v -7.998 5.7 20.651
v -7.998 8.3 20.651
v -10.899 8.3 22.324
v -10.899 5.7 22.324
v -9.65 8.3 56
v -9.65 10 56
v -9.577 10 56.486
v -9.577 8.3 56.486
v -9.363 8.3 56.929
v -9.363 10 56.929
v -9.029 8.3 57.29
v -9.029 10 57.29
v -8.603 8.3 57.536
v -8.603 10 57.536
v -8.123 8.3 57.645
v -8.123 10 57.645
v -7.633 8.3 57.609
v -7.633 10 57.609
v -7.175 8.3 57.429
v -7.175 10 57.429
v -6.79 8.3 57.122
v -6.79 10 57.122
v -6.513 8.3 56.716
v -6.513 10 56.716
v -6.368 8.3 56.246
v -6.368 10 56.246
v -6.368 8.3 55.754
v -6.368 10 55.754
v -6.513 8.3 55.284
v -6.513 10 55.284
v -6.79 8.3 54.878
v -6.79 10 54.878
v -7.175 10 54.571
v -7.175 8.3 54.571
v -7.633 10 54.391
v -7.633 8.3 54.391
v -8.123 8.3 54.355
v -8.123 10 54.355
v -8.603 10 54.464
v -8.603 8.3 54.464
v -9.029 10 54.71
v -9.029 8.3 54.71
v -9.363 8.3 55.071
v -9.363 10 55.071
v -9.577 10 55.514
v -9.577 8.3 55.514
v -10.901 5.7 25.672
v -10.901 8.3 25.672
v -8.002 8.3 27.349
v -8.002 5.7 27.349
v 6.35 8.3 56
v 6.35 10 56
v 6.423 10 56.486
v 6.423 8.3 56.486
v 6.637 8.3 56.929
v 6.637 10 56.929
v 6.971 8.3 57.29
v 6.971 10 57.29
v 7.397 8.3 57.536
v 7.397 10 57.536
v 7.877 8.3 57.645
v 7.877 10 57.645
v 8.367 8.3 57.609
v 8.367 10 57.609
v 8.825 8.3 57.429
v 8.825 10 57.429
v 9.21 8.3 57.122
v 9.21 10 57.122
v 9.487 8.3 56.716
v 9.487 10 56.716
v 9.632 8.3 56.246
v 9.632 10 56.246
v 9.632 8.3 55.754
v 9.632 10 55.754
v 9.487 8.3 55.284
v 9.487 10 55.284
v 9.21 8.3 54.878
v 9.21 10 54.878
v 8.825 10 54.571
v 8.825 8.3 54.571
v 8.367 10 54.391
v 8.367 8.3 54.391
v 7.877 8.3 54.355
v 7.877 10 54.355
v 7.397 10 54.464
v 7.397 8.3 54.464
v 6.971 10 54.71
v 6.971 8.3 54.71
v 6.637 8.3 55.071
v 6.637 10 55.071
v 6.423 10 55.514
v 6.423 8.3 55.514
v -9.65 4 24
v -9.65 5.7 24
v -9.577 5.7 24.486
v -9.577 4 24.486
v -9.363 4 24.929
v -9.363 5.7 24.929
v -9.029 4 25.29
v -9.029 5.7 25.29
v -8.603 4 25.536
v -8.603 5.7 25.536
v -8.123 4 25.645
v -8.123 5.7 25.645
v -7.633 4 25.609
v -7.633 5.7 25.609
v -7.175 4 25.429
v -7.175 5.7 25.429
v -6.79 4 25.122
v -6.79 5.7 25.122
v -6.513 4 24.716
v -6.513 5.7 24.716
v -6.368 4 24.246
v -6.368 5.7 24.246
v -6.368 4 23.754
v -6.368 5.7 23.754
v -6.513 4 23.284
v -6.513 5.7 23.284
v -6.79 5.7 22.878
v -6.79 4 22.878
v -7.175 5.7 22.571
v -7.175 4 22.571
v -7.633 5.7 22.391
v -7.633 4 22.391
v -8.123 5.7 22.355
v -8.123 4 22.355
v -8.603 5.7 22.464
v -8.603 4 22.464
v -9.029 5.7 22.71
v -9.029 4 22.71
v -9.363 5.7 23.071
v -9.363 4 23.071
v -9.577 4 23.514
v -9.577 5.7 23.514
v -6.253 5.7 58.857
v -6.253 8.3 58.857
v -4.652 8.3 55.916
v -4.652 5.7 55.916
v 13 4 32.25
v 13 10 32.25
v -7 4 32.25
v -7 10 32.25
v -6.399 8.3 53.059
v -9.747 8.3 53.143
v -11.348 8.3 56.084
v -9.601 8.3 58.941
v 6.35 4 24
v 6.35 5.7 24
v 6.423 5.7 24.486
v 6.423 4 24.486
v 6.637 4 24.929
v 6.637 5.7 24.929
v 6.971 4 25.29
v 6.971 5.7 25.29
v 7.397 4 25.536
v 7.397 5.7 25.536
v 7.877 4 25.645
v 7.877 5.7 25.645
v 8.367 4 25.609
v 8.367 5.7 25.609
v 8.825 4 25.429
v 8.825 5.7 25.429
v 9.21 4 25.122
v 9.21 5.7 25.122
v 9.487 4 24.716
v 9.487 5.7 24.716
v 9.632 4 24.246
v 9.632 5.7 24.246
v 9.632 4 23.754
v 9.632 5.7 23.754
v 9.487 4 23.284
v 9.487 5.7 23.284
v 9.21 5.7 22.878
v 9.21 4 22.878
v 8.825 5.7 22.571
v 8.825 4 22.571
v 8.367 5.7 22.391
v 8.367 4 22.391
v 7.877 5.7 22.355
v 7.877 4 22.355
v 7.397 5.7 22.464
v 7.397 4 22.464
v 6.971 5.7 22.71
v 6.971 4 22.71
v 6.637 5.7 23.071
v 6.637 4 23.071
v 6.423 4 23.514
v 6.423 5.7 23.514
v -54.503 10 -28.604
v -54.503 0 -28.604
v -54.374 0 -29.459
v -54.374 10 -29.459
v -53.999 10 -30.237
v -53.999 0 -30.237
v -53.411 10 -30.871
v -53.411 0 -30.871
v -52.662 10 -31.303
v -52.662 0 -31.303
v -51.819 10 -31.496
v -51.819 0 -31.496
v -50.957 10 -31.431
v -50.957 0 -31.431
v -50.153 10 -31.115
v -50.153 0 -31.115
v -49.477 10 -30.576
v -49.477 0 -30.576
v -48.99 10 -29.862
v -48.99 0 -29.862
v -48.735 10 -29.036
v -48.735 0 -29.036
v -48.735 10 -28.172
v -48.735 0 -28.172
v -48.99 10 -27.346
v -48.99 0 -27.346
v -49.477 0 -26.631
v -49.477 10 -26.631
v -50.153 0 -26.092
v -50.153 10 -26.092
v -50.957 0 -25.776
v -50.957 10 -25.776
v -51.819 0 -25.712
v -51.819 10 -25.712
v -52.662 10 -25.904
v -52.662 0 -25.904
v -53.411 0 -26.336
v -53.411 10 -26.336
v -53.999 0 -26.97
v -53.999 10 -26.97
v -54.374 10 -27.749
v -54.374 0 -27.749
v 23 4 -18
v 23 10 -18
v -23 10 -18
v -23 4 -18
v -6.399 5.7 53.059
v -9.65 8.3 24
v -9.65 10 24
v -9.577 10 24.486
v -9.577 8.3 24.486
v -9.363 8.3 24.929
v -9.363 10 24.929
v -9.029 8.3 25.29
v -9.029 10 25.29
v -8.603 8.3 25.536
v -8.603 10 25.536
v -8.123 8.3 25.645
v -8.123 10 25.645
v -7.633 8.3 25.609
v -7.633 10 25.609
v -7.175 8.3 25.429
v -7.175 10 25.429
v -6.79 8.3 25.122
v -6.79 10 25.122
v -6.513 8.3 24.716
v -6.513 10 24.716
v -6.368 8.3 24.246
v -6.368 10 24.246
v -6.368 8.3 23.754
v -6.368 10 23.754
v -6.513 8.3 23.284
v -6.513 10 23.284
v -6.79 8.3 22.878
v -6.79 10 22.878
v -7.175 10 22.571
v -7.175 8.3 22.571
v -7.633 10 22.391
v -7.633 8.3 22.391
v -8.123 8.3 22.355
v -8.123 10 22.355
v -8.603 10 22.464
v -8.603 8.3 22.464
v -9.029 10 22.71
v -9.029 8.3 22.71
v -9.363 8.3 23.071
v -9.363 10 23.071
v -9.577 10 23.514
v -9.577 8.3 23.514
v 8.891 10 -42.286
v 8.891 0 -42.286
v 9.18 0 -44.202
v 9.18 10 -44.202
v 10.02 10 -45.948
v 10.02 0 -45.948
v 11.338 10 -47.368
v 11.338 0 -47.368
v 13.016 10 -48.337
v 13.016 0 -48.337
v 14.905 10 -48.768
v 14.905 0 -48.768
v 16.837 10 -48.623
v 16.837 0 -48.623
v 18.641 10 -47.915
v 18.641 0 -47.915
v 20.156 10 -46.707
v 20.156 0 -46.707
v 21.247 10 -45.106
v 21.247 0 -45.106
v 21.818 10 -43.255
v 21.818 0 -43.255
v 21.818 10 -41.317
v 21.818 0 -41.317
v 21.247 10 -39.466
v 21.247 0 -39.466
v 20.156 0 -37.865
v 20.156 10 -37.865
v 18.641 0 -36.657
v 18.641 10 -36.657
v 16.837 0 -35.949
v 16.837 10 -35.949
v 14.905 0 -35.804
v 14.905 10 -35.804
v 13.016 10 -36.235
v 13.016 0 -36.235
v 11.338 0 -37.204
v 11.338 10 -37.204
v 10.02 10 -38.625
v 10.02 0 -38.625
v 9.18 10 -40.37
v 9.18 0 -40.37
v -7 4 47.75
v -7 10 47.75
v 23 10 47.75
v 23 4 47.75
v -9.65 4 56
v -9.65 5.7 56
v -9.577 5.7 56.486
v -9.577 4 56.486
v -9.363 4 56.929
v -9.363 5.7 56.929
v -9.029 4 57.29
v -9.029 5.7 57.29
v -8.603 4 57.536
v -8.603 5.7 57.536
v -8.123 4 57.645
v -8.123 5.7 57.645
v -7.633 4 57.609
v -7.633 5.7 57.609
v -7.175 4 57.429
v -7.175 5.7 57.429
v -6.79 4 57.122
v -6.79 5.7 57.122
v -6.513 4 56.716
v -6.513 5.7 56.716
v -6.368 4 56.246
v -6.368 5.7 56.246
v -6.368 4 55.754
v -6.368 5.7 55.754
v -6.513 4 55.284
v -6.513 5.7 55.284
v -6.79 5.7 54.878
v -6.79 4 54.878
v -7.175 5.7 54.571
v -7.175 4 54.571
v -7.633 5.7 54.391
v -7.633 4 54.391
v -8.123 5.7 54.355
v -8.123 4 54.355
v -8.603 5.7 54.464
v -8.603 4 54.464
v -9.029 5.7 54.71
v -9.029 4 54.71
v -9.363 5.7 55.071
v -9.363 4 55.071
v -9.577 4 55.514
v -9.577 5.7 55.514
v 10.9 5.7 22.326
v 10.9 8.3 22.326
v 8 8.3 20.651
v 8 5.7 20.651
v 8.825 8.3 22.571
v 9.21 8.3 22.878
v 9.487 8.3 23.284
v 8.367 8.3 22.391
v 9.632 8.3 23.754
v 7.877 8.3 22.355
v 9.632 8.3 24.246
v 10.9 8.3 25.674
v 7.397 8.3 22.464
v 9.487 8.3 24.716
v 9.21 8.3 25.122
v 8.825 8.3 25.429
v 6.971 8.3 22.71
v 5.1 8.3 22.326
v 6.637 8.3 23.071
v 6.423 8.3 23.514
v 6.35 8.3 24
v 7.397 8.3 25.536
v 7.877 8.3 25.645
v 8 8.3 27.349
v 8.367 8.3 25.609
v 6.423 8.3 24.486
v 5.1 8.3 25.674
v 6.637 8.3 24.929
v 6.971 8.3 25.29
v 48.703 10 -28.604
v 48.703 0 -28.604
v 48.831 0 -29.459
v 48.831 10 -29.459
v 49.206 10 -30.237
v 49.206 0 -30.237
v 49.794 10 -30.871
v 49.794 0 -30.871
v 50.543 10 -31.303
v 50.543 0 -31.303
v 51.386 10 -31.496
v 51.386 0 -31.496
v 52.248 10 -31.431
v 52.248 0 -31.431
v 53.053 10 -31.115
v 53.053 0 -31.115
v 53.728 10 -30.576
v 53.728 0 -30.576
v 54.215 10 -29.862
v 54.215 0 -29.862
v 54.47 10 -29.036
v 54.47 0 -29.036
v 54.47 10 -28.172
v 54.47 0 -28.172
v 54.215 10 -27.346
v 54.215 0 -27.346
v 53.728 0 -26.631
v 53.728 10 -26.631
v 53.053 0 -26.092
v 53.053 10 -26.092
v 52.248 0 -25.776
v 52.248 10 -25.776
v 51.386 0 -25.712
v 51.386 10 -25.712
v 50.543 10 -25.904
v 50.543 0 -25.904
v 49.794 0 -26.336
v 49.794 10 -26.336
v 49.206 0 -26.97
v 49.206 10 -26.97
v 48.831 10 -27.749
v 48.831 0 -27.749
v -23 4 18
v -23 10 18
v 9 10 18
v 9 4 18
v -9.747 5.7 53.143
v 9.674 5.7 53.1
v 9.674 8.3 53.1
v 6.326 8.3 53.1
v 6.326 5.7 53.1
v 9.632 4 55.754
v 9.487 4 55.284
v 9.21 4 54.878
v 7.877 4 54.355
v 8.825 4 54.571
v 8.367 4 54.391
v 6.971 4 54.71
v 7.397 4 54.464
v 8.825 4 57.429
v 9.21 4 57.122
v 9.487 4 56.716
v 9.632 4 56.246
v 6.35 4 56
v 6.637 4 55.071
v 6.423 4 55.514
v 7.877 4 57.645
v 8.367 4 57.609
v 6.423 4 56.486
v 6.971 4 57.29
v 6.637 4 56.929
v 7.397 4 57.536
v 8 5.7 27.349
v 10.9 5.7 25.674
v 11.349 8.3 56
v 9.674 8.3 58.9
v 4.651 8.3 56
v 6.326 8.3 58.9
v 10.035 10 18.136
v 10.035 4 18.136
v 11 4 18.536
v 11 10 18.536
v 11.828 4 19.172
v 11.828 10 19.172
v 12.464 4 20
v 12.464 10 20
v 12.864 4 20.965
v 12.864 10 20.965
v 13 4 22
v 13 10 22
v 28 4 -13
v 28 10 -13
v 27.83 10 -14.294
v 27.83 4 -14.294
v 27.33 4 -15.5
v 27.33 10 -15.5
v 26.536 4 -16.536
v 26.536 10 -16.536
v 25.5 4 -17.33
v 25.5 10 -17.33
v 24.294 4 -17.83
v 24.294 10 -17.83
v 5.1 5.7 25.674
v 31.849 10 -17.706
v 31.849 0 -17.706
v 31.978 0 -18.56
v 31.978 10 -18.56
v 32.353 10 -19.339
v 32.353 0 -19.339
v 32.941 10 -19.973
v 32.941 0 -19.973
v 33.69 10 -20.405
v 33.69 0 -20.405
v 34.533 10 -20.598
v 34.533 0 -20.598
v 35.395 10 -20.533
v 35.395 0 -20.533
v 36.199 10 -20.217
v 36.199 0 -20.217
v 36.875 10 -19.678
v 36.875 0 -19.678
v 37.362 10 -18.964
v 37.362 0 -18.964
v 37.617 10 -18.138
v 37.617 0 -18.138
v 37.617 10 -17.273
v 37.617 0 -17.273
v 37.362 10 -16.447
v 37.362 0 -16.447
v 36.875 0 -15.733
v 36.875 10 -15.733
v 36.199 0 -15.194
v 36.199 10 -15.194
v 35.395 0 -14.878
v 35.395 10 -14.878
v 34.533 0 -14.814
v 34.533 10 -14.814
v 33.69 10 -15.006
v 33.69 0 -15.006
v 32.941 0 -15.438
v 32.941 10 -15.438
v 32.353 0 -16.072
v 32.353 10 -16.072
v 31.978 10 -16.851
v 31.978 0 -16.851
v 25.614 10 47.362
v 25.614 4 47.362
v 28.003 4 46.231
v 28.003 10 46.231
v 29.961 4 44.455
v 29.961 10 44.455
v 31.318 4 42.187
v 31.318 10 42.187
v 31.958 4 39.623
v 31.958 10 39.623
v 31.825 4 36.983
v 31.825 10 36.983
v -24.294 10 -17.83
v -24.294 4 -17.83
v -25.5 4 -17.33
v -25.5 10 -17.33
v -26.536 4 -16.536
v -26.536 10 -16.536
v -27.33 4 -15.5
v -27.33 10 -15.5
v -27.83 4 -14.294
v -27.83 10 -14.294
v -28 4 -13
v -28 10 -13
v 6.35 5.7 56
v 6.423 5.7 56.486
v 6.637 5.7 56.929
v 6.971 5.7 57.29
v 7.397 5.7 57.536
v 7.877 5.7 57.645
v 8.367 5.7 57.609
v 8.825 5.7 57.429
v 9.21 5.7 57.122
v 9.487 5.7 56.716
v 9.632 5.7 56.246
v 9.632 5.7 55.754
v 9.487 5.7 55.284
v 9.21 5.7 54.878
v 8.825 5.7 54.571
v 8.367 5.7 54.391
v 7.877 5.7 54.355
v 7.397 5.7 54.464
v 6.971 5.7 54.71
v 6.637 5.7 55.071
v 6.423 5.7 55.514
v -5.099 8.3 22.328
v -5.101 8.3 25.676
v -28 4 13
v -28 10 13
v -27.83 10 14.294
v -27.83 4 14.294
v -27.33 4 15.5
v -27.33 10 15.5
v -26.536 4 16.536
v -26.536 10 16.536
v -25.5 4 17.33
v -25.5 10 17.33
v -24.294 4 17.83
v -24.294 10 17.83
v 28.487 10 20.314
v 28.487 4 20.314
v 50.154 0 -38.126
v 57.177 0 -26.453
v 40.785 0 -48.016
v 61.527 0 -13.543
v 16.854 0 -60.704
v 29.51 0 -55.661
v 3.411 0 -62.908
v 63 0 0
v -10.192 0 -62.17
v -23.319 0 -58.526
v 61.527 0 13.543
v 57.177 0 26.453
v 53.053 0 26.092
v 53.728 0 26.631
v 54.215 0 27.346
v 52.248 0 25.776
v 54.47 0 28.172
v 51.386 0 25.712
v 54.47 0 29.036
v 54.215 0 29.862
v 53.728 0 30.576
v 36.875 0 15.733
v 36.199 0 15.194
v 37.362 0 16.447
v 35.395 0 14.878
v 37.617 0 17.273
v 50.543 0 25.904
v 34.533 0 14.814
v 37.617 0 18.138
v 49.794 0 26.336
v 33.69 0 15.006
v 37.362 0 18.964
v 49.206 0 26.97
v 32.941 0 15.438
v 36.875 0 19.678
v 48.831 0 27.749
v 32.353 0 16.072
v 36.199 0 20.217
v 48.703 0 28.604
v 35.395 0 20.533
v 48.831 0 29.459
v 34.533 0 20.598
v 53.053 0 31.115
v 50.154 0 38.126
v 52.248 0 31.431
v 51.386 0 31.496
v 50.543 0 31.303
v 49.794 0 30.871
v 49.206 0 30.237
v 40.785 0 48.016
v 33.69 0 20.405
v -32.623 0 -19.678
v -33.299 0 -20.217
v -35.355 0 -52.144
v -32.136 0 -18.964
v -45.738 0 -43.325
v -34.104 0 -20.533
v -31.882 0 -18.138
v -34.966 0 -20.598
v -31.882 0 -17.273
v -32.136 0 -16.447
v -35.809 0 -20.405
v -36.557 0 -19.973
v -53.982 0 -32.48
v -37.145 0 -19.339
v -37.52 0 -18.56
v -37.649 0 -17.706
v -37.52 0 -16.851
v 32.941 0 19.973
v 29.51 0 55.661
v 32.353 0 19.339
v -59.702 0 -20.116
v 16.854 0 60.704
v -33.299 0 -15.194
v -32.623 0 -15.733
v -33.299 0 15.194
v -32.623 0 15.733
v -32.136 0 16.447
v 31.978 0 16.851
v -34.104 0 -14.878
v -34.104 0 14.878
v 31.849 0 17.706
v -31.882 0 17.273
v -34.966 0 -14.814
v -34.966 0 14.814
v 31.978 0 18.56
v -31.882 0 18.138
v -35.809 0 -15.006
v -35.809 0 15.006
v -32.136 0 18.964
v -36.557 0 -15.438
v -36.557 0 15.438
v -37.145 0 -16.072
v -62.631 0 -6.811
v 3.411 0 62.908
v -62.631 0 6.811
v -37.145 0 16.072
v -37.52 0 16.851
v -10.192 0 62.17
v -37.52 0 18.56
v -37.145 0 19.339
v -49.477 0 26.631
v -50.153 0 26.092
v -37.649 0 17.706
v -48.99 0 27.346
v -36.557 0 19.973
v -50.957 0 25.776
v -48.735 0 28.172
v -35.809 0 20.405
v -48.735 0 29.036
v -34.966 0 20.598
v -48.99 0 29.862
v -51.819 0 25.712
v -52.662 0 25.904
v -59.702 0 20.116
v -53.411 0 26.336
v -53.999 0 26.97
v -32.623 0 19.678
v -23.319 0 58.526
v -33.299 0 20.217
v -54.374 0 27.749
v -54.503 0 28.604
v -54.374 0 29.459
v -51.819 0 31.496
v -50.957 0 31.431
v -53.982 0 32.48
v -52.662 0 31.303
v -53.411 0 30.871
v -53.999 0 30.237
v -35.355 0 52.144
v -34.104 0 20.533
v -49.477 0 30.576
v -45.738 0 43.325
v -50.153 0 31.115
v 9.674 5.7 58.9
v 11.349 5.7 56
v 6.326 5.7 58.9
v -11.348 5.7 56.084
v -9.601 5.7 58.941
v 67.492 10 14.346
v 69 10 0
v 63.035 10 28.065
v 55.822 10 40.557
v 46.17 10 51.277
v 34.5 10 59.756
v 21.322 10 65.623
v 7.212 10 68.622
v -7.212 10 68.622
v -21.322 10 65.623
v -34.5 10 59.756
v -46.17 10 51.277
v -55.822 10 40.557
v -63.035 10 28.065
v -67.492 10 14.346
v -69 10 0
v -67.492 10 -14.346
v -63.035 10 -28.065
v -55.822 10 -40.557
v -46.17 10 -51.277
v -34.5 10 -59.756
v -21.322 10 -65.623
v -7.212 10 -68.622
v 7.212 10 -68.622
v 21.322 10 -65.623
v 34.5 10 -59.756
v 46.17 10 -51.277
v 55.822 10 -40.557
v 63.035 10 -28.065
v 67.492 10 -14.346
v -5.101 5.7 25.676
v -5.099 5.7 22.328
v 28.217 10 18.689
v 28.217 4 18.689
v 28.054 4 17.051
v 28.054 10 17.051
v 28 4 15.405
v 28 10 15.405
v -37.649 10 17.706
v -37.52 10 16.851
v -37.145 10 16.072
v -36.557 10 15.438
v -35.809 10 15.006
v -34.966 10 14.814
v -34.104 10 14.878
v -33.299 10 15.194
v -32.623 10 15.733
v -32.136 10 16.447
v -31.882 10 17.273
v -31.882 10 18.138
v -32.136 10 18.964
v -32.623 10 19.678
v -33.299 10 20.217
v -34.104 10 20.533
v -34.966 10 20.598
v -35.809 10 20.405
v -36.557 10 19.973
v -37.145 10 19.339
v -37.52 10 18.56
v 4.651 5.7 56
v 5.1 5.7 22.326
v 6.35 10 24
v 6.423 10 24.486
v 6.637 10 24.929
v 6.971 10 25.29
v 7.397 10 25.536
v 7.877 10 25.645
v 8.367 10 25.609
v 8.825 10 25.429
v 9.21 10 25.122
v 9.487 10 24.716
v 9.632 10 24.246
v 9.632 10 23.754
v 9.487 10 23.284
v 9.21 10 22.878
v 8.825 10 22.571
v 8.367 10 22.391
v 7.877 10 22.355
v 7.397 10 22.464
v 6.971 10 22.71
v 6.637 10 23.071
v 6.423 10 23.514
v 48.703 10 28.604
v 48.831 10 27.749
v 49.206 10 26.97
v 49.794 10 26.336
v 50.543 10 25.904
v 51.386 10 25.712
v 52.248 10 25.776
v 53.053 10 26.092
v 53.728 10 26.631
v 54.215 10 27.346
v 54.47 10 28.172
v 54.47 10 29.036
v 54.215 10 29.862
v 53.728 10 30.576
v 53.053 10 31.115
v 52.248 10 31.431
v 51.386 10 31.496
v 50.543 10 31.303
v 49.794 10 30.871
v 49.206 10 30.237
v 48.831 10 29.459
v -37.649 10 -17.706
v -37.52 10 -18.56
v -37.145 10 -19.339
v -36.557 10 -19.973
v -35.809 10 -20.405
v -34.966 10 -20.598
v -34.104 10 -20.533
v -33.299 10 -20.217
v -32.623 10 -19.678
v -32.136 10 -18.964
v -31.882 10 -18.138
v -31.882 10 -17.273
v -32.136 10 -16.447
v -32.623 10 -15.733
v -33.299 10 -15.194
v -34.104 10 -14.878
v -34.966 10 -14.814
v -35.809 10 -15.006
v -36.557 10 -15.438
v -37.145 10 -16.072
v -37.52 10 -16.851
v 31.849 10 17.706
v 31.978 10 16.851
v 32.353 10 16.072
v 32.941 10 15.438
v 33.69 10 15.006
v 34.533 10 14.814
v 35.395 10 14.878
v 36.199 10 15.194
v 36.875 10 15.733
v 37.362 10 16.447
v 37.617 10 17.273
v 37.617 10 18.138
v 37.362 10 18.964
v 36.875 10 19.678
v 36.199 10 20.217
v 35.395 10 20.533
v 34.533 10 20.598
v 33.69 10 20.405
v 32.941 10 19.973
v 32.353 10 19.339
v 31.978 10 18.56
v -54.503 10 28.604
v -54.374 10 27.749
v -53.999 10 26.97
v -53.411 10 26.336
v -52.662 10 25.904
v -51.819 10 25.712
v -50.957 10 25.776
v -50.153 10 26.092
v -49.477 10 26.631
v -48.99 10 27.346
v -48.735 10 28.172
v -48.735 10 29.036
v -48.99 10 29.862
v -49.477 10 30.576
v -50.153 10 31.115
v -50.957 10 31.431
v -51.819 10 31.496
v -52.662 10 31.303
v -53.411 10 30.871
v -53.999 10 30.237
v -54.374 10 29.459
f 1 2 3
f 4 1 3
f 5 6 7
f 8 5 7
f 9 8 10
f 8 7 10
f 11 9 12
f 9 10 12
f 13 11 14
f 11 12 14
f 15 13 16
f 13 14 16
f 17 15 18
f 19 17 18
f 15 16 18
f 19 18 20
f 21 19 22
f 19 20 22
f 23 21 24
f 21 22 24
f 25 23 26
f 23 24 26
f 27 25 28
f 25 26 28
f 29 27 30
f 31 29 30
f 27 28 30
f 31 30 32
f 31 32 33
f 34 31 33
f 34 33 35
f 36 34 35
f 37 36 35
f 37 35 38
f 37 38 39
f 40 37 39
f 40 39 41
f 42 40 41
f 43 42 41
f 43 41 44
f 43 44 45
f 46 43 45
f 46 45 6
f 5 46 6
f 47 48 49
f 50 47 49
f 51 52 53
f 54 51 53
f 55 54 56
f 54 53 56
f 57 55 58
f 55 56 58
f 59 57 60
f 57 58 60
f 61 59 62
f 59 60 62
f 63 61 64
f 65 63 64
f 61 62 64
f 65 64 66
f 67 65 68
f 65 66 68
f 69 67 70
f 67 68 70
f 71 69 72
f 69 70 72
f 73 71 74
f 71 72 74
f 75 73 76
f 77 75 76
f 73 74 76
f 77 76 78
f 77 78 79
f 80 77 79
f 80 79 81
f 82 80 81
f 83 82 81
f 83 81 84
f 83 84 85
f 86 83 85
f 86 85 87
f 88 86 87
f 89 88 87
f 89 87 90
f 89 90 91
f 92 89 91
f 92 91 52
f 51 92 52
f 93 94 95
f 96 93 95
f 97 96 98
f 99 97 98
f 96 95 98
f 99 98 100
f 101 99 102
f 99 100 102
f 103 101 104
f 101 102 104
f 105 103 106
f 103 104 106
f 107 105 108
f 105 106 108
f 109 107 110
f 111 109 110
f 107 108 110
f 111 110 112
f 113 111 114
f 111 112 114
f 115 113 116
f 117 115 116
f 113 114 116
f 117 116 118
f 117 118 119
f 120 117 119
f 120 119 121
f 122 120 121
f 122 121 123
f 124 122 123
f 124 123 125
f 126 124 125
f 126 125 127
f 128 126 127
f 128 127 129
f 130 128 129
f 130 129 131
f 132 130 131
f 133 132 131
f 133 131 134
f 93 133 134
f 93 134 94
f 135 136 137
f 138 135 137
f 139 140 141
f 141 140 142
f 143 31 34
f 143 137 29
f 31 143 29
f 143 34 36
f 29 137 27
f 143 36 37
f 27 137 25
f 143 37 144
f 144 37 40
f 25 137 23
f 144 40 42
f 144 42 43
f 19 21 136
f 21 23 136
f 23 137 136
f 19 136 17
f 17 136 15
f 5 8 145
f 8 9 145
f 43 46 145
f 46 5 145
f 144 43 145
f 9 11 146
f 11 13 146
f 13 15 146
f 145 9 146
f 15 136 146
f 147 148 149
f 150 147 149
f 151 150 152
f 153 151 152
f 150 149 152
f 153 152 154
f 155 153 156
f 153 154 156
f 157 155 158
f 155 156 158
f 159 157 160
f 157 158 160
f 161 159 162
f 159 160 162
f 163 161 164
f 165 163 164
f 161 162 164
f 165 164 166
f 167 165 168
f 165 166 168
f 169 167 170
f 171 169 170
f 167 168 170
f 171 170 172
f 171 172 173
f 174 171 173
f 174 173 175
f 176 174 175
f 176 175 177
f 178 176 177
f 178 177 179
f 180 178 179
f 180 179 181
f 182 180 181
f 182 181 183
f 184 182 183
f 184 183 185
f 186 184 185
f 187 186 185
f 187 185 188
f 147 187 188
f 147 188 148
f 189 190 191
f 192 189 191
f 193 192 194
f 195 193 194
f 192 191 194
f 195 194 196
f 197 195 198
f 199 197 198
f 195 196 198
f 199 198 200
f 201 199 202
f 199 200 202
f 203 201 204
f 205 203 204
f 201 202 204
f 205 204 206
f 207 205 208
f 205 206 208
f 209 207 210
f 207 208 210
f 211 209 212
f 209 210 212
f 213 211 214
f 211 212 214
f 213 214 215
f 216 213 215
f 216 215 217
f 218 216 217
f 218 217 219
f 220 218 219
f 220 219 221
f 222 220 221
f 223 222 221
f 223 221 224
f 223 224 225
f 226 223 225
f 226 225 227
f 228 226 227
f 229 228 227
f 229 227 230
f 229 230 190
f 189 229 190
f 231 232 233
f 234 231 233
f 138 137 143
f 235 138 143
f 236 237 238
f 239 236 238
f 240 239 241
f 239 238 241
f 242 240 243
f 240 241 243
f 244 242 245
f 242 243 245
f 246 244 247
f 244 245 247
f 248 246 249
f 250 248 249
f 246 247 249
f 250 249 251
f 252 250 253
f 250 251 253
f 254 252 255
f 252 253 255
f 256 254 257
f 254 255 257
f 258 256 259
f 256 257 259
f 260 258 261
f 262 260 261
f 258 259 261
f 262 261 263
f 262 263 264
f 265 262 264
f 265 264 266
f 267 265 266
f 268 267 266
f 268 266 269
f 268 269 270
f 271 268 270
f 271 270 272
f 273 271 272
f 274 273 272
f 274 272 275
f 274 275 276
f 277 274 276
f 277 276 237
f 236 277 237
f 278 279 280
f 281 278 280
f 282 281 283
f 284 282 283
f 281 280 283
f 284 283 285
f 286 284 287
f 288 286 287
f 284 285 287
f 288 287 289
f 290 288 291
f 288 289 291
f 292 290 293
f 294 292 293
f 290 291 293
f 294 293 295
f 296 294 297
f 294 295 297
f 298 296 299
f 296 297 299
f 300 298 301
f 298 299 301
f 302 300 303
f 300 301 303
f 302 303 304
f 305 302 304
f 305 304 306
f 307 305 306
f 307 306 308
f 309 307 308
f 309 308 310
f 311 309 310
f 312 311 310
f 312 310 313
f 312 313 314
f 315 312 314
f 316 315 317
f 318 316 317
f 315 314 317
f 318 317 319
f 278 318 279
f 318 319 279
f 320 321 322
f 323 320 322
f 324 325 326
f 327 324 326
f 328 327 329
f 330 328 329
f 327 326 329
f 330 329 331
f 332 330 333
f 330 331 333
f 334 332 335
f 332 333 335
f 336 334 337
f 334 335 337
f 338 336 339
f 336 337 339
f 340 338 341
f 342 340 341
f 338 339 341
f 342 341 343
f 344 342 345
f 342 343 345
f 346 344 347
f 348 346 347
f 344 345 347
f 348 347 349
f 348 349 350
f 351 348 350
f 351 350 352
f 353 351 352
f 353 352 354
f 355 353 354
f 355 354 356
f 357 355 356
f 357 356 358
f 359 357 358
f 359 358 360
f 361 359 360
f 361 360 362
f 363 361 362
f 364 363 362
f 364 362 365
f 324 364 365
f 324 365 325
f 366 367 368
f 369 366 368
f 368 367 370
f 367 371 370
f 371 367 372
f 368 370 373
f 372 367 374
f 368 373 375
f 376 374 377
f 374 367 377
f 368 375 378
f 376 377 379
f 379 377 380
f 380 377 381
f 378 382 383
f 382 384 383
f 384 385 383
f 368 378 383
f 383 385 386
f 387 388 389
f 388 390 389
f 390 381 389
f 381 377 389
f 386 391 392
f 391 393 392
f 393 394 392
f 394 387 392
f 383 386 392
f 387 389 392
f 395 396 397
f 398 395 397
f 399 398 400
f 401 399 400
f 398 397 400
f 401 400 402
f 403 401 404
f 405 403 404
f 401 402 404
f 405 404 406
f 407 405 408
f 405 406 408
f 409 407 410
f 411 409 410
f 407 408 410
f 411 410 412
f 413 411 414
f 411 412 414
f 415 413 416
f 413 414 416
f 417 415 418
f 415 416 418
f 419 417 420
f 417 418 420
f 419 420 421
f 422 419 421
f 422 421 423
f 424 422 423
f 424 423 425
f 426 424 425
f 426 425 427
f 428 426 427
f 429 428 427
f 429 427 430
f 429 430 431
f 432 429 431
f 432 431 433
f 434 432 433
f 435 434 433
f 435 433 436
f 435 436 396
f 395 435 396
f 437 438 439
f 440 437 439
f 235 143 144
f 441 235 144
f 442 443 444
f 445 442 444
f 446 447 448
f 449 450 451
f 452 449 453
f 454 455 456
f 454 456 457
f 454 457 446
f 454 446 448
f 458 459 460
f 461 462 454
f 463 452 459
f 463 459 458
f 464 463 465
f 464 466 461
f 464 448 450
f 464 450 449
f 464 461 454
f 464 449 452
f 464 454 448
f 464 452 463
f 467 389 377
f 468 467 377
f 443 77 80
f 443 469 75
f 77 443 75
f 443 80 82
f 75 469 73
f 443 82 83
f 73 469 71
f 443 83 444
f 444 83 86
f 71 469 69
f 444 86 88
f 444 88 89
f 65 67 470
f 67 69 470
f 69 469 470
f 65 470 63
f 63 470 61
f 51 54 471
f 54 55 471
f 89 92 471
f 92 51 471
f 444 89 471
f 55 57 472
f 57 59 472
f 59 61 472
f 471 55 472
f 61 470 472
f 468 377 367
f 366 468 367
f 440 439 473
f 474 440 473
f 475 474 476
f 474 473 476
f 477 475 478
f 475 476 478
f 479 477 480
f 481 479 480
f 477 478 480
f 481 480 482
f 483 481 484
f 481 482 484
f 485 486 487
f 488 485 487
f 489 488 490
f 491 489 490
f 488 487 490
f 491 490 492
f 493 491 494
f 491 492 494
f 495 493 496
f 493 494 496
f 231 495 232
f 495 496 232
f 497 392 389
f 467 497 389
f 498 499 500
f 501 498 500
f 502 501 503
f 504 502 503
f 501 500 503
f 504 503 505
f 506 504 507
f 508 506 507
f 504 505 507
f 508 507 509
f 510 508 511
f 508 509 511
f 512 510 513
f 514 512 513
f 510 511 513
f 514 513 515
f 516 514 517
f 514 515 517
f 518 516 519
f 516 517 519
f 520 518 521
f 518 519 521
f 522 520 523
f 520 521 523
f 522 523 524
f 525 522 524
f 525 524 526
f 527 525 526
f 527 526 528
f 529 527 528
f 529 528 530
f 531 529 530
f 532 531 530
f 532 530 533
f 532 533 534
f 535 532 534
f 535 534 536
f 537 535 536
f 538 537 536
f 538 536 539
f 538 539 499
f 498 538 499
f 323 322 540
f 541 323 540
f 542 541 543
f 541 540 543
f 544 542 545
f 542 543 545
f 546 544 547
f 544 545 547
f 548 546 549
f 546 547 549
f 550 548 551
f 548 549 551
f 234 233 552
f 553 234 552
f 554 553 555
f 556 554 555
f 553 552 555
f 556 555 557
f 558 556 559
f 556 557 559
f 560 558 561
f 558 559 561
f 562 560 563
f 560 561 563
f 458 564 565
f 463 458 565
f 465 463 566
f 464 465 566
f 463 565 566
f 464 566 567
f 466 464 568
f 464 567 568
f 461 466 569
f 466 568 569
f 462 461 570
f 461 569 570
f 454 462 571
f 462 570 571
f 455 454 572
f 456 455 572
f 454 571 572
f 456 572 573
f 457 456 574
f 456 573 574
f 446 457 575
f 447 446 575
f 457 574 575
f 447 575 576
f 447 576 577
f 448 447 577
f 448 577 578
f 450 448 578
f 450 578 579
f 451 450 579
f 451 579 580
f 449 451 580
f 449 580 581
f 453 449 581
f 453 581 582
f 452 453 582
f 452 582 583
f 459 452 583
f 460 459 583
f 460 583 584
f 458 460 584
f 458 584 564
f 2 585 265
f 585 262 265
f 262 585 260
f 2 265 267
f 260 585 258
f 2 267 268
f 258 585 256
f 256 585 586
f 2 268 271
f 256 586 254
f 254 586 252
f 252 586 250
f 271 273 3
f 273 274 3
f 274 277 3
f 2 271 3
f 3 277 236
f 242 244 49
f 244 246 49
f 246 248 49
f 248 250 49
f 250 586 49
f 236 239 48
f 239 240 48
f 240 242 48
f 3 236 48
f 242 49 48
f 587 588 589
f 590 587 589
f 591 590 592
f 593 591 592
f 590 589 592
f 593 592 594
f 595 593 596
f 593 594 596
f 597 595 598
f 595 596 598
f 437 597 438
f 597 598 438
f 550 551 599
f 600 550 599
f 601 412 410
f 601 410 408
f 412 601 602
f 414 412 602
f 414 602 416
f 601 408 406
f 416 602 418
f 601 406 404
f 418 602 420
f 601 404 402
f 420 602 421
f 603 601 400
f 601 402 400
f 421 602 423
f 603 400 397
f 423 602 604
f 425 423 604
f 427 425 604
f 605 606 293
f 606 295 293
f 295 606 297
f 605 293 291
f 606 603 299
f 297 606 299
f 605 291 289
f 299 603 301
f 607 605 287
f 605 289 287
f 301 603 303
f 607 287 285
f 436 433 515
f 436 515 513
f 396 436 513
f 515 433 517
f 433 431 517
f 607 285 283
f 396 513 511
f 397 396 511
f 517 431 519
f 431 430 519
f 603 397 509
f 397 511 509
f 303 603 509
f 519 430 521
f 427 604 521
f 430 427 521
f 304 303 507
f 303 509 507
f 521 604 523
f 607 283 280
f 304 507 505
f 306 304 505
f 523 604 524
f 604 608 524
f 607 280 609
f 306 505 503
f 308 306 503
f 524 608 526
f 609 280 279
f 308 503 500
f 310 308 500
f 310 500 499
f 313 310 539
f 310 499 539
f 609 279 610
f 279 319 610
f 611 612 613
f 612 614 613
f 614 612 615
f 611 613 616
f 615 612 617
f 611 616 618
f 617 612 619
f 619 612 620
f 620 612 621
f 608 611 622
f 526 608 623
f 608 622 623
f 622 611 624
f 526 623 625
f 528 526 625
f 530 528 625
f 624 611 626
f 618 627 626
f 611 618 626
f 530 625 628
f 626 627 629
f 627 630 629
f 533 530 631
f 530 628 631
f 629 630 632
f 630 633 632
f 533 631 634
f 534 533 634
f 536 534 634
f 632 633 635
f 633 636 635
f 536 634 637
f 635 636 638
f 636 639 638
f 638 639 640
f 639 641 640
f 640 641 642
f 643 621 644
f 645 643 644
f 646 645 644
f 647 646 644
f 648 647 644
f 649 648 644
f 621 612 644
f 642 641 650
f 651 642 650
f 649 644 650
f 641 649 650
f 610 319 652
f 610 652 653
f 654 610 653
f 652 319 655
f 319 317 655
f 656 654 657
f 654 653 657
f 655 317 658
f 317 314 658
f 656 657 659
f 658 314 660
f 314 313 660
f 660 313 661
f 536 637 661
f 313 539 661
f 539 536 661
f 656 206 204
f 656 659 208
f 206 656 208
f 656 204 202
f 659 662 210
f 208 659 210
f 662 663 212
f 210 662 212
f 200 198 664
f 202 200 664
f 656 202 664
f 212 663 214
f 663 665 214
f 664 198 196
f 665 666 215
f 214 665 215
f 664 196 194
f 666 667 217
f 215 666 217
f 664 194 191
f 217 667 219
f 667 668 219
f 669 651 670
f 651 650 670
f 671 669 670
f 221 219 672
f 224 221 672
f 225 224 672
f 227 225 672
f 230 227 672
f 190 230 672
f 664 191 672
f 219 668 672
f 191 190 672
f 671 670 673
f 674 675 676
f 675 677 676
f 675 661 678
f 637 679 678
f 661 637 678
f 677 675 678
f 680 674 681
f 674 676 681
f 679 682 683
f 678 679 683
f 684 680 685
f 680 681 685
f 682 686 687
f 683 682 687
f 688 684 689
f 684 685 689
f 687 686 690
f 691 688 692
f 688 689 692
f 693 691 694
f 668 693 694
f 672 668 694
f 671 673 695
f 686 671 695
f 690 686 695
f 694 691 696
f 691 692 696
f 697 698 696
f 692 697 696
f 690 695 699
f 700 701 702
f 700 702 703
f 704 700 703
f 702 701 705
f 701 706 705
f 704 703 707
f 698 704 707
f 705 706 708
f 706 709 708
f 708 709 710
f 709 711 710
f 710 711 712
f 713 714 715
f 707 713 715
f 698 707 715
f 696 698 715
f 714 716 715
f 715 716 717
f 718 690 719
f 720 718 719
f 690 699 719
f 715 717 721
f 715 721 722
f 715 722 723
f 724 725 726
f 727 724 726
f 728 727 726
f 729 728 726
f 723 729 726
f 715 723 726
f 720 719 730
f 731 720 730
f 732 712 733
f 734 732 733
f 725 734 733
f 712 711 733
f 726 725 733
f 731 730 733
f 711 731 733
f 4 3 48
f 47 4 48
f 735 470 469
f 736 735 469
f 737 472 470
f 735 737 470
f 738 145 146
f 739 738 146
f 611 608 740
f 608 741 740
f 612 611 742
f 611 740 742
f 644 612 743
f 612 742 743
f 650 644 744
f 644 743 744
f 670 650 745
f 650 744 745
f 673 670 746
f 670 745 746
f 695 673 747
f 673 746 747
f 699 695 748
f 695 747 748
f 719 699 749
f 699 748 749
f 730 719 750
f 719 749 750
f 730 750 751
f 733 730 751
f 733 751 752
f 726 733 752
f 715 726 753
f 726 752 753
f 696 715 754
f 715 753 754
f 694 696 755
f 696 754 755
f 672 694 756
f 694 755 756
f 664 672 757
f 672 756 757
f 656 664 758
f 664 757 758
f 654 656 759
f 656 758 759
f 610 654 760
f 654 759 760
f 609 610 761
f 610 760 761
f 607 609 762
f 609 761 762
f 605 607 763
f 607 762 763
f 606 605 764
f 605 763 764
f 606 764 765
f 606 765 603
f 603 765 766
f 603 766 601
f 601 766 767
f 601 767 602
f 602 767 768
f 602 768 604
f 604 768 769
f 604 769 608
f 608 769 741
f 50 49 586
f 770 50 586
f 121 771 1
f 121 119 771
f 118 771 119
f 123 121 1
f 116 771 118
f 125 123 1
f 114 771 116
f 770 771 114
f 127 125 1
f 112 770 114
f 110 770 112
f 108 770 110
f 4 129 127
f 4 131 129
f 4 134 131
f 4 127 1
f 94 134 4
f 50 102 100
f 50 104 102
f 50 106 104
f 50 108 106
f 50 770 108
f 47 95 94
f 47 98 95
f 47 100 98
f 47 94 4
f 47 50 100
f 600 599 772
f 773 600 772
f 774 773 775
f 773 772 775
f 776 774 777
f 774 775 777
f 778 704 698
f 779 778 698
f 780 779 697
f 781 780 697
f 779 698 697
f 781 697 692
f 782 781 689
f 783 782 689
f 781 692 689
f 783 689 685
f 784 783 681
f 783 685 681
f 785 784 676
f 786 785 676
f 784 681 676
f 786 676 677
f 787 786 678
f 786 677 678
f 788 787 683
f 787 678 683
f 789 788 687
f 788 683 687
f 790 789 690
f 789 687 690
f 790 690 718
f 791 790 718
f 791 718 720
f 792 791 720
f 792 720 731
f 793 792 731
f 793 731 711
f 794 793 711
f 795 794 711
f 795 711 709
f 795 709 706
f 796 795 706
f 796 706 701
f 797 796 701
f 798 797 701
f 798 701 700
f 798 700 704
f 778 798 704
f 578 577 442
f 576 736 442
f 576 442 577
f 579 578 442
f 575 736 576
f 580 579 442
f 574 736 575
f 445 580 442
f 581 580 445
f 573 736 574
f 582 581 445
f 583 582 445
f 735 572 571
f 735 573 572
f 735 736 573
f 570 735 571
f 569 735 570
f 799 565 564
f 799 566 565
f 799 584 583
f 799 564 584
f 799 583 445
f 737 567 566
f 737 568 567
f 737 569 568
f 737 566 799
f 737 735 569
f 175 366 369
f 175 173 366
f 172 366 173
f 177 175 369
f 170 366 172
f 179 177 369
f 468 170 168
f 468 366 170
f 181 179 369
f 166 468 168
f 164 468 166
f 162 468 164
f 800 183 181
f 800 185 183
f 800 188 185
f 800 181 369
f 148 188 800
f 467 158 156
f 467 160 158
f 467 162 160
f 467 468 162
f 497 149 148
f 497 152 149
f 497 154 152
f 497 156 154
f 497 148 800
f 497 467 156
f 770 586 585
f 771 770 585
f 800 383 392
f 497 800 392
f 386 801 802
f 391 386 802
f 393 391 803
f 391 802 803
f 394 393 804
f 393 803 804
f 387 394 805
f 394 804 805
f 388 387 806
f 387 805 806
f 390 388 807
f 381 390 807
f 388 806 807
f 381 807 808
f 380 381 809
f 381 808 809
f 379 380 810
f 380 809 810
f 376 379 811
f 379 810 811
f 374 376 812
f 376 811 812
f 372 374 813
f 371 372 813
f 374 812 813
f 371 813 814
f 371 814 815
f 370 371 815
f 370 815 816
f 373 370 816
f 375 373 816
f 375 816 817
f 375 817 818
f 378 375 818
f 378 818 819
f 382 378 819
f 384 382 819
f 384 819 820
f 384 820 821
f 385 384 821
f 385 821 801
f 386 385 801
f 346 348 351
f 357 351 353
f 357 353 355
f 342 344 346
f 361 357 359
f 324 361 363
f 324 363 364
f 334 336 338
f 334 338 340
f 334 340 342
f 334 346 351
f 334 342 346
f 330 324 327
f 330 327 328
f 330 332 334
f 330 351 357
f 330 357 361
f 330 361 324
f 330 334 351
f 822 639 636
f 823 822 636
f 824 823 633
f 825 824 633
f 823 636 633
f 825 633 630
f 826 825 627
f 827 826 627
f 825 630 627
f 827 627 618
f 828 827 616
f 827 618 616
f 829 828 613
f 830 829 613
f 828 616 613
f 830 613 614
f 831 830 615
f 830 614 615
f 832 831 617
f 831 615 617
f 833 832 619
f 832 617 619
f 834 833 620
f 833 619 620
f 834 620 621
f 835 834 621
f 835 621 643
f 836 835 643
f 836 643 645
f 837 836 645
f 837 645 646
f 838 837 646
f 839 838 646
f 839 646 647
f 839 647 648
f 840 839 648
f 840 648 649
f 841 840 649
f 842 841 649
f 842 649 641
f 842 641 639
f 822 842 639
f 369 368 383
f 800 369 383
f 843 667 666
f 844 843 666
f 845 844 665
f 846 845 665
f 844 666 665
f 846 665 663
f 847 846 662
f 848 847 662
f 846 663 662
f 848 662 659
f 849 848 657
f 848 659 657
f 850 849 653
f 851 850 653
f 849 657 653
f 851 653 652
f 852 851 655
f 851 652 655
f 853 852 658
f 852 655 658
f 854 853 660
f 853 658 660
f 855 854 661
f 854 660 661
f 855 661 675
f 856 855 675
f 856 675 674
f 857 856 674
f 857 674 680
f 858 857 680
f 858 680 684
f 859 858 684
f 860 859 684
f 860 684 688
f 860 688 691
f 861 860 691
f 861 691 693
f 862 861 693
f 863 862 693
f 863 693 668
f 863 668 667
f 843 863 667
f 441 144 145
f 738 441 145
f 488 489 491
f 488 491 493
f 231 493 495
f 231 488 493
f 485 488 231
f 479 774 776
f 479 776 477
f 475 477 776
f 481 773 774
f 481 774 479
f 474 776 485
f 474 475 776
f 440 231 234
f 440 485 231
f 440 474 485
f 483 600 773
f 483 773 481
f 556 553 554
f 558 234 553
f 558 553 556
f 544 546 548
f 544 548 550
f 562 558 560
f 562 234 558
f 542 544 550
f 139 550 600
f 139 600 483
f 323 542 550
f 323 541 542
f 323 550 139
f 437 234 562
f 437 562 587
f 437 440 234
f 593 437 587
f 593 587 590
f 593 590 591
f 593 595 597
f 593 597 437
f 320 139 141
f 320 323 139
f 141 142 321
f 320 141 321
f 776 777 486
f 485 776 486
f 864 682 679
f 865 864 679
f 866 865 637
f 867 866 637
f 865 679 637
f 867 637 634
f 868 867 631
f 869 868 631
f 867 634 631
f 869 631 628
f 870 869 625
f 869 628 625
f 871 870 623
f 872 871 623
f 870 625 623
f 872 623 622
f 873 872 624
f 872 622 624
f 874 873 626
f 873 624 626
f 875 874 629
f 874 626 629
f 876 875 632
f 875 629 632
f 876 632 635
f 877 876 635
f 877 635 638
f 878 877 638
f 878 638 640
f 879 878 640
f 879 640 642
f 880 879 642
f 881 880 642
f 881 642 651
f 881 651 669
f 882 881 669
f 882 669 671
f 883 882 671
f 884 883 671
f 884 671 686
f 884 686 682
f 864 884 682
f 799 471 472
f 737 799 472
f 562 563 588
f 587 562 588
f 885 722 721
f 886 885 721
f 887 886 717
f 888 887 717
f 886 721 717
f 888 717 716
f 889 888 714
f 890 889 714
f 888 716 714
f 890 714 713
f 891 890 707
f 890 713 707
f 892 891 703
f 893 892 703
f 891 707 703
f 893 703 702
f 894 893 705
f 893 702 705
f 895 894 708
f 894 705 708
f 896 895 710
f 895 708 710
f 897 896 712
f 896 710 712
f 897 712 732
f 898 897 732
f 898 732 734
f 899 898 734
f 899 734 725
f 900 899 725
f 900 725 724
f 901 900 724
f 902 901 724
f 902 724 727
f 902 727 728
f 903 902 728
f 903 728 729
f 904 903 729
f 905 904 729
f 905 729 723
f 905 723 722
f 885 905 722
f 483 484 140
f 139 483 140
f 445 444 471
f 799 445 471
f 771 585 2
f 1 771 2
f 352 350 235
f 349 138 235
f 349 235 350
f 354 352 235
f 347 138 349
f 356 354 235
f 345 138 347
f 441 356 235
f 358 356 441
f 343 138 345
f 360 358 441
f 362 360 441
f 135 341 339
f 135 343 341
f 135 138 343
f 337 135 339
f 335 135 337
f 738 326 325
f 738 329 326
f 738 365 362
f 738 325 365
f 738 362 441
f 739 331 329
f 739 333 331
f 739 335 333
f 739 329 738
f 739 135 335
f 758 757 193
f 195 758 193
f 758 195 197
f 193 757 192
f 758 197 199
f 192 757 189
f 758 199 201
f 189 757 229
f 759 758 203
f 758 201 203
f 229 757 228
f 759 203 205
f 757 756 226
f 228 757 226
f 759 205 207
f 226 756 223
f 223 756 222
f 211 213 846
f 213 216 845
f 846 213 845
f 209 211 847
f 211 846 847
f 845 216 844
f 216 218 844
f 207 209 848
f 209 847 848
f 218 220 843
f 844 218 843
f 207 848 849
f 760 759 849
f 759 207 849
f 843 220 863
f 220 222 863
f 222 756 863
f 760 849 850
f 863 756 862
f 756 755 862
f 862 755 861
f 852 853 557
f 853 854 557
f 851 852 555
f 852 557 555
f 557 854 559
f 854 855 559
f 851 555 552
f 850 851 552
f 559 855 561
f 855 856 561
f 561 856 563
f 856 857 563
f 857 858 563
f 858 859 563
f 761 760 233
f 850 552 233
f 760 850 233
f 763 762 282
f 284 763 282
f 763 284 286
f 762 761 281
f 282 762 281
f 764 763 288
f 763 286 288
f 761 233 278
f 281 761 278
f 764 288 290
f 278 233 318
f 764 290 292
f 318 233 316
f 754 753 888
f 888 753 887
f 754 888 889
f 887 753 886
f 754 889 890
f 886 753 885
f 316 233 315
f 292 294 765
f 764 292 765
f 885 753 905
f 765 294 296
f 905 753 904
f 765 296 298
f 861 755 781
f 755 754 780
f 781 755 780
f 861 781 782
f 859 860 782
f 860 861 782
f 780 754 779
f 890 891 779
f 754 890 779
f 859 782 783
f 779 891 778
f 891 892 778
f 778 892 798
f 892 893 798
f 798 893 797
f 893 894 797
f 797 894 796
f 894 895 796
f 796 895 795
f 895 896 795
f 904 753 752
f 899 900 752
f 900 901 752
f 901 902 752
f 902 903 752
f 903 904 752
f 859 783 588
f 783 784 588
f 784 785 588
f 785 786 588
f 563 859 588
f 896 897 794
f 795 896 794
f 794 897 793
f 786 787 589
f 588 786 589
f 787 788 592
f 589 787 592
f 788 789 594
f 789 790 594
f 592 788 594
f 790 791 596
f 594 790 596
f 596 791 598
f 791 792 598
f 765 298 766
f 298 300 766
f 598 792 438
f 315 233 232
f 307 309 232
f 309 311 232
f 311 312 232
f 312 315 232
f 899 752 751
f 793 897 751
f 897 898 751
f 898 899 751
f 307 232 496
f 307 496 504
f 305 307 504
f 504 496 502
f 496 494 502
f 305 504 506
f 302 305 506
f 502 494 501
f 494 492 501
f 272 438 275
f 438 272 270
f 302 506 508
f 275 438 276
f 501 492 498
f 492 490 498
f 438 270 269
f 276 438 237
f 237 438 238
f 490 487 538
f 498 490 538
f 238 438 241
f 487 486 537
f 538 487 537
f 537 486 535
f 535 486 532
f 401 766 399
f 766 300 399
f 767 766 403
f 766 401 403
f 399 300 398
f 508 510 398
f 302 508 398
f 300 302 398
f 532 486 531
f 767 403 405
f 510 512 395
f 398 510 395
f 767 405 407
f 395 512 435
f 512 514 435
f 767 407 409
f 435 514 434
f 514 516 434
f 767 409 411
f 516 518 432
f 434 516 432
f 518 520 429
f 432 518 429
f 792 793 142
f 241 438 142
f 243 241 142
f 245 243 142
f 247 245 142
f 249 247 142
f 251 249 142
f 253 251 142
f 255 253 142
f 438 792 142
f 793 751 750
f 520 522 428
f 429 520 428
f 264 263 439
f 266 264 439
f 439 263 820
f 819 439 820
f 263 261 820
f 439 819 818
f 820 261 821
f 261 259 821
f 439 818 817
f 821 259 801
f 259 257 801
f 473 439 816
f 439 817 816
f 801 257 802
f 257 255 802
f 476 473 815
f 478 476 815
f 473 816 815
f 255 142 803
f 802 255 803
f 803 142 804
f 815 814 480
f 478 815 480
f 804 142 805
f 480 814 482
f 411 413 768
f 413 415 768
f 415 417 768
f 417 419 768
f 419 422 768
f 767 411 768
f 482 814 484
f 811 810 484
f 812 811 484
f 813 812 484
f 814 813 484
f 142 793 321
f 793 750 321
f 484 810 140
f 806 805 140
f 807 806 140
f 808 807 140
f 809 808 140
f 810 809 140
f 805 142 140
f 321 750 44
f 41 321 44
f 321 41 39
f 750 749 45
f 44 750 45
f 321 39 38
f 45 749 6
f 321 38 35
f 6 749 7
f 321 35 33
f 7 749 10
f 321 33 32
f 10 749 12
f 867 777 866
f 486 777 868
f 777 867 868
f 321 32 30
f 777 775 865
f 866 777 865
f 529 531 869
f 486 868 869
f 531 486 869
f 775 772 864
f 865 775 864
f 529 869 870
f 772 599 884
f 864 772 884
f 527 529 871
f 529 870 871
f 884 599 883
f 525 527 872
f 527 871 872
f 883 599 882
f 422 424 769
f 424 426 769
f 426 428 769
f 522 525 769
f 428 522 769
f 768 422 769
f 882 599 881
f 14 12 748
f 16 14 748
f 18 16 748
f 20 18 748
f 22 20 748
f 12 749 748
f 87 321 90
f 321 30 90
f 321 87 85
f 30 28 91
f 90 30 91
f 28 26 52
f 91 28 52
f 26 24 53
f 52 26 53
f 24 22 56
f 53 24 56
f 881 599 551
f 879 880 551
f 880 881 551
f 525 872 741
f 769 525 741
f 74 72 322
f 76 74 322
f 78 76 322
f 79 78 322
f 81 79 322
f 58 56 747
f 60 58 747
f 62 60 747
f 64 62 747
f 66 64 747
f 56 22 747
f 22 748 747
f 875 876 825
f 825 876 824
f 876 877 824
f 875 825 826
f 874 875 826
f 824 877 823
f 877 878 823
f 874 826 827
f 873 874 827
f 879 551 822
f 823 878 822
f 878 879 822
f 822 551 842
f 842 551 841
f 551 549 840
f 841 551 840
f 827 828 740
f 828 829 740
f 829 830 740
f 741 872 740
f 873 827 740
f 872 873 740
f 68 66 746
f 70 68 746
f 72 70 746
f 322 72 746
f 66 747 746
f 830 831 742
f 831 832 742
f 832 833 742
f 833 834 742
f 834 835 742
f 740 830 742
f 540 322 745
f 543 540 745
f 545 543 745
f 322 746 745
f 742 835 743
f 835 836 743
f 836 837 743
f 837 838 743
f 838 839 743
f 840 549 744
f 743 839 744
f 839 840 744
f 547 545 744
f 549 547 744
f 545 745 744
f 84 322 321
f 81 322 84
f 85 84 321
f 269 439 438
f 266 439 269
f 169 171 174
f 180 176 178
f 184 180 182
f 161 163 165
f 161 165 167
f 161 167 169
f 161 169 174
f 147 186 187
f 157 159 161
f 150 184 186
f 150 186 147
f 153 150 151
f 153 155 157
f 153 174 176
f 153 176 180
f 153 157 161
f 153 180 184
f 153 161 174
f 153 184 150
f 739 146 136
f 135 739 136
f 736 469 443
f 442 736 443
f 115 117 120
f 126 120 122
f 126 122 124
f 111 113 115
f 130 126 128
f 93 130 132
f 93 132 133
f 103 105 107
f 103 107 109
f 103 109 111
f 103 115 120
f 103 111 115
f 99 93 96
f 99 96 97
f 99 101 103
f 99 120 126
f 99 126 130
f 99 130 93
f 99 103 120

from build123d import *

# Parameters (mm, degrees)
SKETCH4_R          = 1.65
CUT_EXTRUDE1_DEPTH = 4
CUT_EXTRUDE2_START = 4
SKETCH5_R          = 2.9
CUT_EXTRUDE2_DEPTH = 15
SKETCH7_R          = 6.5
CUT_EXTRUDE4_DEPTH = 10
SKETCH10_R         = 1.65
CUT_EXTRUDE5_DEPTH = 6
CUT_EXTRUDE6_START = -1.7
CUT_EXTRUDE6_DEPTH = 2.6


with BuildPart() as part:
    # Sketch1 → Revolve1 (revolve)
    with BuildSketch(Plane.XY):
        Polygon((0, 0), (63, 0), (69, 10), (0, 10), align=None)
    revolve(axis=Axis((0, 10, 0), (0, -1, 0)))

    # Sketch4 → Cut-Extrude1 (cut)
    with BuildSketch(Plane(origin=(0, 0, 0), x_dir=(1, 0, 0), z_dir=(0, 1, 0))):
        with Locations((34.749254443, 17.70562949)):
            Circle(SKETCH4_R)
        with Locations((51.602562721, 28.603767595)):
            Circle(SKETCH4_R)
        with Locations((51.602562721, -28.603767595)):
            Circle(SKETCH4_R)
        with Locations((34.749254443, -17.70562949)):
            Circle(SKETCH4_R)
        with Locations((-34.749254443, -17.70562949)):
            Circle(SKETCH4_R)
        with Locations((-51.602562721, -28.603767595)):
            Circle(SKETCH4_R)
        with Locations((-51.602562721, 28.603767595)):
            Circle(SKETCH4_R)
        with Locations((-34.749254443, 17.70562949)):
            Circle(SKETCH4_R)
    extrude(amount=CUT_EXTRUDE1_DEPTH, mode=Mode.SUBTRACT)

    # Sketch5 → Cut-Extrude2 (cut, through all)
    with BuildSketch(Plane(origin=(0, 0, 0), x_dir=(-1, 0, 0), z_dir=(0, -1, 0)).offset(CUT_EXTRUDE2_START)):
        with Locations((-51.602562721, 28.603767595)):
            Circle(SKETCH5_R)
        with Locations((-51.602562721, -28.603767595)):
            Circle(SKETCH5_R)
        with Locations((51.602562721, -28.603767595)):
            Circle(SKETCH5_R)
        with Locations((51.602562721, 28.603767595)):
            Circle(SKETCH5_R)
        with Locations((-34.749254443, 17.70562949)):
            Circle(SKETCH5_R)
        with Locations((-34.749254443, -17.70562949)):
            Circle(SKETCH5_R)
        with Locations((34.749254443, -17.70562949)):
            Circle(SKETCH5_R)
        with Locations((34.749254443, 17.70562949)):
            Circle(SKETCH5_R)
    extrude(amount=-CUT_EXTRUDE2_DEPTH, mode=Mode.SUBTRACT)

    # Sketch7 → Cut-Extrude4 (cut)
    with BuildSketch(Plane(origin=(0, 0, 0), x_dir=(-1, 0, 0), z_dir=(0, -1, 0))):
        with Locations((-15.39090645, 42.286167935)):
            Circle(SKETCH7_R)
    extrude(amount=-CUT_EXTRUDE4_DEPTH, mode=Mode.SUBTRACT)

    # Sketch10 → Cut-Extrude5 (cut)
    with BuildSketch(Plane(origin=(0, 10, 0), x_dir=(-1, 0, 0), z_dir=(0, 1, 0))):
        with Locations((-8, 56)):
            Circle(SKETCH10_R)
        with Locations((8, 56)):
            Circle(SKETCH10_R)
        with Locations((8, 24)):
            Circle(SKETCH10_R)
        with Locations((-8, 24)):
            Circle(SKETCH10_R)
        with BuildLine():
            Line((-13, 32.25), (7, 32.25))
            Line((7, 32.25), (7, 47.75))
            Line((7, 47.75), (-23, 47.75))
            ThreePointArc((-23, 47.75), (-29.960784303, 44.455040042), (-31.824789595, 36.982773752))
            Line((-31.824789595, 36.982773752), (-28.486695571, 20.31372674))
            ThreePointArc((-28.486695571, 20.31372674), (-28.121971433, 17.871279613), (-28, 15.40476494))
            Line((-28, 15.40476494), (-28, -13))
            ThreePointArc((-28, -13), (-26.535533906, -16.535533906), (-23, -18))
            Line((-23, -18), (23, -18))
            ThreePointArc((23, -18), (26.535533906, -16.535533906), (28, -13))
            Line((28, -13), (28, 13))
            ThreePointArc((28, 13), (26.535533906, 16.535533906), (23, 18))
            Line((23, 18), (-9, 18))
            ThreePointArc((-9, 18), (-11.828427125, 19.171572875), (-13, 22))
            Line((-13, 22), (-13, 32.25))
        make_face()
    extrude(amount=-CUT_EXTRUDE5_DEPTH, mode=Mode.SUBTRACT)

    # Sketch11 → Cut-Extrude6 (cut)
    with BuildSketch(Plane(origin=(0, 10, 0), x_dir=(-1, 0, 0), z_dir=(0, 1, 0)).offset(CUT_EXTRUDE6_START)):
        Polygon((-4.651368439, 56), (-6.325684219, 58.9), (-9.674315781, 58.9), (-11.348631561, 56), (-9.674315781, 53.1), (-6.325684219, 53.1), align=None)
        Polygon((11.347570698, 56.084283782), (9.600793452, 58.941223157), (6.253222754, 58.856939374), (4.652429302, 55.915716218), (6.399206548, 53.058776843), (9.746777246, 53.143060626), align=None)
        Polygon((-5.1, 25.674315781), (-8, 27.348631561), (-10.9, 25.674315781), (-10.9, 22.325684219), (-8, 20.651368439), (-5.1, 22.325684219), align=None)
        Polygon((10.898923771, 22.323821518), (10.901075032, 25.672452388), (8.002151261, 27.34863087), (5.101076229, 25.676178482), (5.098924968, 22.327547612), (7.997848739, 20.65136913), align=None)
    extrude(amount=-CUT_EXTRUDE6_DEPTH, mode=Mode.SUBTRACT)


solid = part.part
